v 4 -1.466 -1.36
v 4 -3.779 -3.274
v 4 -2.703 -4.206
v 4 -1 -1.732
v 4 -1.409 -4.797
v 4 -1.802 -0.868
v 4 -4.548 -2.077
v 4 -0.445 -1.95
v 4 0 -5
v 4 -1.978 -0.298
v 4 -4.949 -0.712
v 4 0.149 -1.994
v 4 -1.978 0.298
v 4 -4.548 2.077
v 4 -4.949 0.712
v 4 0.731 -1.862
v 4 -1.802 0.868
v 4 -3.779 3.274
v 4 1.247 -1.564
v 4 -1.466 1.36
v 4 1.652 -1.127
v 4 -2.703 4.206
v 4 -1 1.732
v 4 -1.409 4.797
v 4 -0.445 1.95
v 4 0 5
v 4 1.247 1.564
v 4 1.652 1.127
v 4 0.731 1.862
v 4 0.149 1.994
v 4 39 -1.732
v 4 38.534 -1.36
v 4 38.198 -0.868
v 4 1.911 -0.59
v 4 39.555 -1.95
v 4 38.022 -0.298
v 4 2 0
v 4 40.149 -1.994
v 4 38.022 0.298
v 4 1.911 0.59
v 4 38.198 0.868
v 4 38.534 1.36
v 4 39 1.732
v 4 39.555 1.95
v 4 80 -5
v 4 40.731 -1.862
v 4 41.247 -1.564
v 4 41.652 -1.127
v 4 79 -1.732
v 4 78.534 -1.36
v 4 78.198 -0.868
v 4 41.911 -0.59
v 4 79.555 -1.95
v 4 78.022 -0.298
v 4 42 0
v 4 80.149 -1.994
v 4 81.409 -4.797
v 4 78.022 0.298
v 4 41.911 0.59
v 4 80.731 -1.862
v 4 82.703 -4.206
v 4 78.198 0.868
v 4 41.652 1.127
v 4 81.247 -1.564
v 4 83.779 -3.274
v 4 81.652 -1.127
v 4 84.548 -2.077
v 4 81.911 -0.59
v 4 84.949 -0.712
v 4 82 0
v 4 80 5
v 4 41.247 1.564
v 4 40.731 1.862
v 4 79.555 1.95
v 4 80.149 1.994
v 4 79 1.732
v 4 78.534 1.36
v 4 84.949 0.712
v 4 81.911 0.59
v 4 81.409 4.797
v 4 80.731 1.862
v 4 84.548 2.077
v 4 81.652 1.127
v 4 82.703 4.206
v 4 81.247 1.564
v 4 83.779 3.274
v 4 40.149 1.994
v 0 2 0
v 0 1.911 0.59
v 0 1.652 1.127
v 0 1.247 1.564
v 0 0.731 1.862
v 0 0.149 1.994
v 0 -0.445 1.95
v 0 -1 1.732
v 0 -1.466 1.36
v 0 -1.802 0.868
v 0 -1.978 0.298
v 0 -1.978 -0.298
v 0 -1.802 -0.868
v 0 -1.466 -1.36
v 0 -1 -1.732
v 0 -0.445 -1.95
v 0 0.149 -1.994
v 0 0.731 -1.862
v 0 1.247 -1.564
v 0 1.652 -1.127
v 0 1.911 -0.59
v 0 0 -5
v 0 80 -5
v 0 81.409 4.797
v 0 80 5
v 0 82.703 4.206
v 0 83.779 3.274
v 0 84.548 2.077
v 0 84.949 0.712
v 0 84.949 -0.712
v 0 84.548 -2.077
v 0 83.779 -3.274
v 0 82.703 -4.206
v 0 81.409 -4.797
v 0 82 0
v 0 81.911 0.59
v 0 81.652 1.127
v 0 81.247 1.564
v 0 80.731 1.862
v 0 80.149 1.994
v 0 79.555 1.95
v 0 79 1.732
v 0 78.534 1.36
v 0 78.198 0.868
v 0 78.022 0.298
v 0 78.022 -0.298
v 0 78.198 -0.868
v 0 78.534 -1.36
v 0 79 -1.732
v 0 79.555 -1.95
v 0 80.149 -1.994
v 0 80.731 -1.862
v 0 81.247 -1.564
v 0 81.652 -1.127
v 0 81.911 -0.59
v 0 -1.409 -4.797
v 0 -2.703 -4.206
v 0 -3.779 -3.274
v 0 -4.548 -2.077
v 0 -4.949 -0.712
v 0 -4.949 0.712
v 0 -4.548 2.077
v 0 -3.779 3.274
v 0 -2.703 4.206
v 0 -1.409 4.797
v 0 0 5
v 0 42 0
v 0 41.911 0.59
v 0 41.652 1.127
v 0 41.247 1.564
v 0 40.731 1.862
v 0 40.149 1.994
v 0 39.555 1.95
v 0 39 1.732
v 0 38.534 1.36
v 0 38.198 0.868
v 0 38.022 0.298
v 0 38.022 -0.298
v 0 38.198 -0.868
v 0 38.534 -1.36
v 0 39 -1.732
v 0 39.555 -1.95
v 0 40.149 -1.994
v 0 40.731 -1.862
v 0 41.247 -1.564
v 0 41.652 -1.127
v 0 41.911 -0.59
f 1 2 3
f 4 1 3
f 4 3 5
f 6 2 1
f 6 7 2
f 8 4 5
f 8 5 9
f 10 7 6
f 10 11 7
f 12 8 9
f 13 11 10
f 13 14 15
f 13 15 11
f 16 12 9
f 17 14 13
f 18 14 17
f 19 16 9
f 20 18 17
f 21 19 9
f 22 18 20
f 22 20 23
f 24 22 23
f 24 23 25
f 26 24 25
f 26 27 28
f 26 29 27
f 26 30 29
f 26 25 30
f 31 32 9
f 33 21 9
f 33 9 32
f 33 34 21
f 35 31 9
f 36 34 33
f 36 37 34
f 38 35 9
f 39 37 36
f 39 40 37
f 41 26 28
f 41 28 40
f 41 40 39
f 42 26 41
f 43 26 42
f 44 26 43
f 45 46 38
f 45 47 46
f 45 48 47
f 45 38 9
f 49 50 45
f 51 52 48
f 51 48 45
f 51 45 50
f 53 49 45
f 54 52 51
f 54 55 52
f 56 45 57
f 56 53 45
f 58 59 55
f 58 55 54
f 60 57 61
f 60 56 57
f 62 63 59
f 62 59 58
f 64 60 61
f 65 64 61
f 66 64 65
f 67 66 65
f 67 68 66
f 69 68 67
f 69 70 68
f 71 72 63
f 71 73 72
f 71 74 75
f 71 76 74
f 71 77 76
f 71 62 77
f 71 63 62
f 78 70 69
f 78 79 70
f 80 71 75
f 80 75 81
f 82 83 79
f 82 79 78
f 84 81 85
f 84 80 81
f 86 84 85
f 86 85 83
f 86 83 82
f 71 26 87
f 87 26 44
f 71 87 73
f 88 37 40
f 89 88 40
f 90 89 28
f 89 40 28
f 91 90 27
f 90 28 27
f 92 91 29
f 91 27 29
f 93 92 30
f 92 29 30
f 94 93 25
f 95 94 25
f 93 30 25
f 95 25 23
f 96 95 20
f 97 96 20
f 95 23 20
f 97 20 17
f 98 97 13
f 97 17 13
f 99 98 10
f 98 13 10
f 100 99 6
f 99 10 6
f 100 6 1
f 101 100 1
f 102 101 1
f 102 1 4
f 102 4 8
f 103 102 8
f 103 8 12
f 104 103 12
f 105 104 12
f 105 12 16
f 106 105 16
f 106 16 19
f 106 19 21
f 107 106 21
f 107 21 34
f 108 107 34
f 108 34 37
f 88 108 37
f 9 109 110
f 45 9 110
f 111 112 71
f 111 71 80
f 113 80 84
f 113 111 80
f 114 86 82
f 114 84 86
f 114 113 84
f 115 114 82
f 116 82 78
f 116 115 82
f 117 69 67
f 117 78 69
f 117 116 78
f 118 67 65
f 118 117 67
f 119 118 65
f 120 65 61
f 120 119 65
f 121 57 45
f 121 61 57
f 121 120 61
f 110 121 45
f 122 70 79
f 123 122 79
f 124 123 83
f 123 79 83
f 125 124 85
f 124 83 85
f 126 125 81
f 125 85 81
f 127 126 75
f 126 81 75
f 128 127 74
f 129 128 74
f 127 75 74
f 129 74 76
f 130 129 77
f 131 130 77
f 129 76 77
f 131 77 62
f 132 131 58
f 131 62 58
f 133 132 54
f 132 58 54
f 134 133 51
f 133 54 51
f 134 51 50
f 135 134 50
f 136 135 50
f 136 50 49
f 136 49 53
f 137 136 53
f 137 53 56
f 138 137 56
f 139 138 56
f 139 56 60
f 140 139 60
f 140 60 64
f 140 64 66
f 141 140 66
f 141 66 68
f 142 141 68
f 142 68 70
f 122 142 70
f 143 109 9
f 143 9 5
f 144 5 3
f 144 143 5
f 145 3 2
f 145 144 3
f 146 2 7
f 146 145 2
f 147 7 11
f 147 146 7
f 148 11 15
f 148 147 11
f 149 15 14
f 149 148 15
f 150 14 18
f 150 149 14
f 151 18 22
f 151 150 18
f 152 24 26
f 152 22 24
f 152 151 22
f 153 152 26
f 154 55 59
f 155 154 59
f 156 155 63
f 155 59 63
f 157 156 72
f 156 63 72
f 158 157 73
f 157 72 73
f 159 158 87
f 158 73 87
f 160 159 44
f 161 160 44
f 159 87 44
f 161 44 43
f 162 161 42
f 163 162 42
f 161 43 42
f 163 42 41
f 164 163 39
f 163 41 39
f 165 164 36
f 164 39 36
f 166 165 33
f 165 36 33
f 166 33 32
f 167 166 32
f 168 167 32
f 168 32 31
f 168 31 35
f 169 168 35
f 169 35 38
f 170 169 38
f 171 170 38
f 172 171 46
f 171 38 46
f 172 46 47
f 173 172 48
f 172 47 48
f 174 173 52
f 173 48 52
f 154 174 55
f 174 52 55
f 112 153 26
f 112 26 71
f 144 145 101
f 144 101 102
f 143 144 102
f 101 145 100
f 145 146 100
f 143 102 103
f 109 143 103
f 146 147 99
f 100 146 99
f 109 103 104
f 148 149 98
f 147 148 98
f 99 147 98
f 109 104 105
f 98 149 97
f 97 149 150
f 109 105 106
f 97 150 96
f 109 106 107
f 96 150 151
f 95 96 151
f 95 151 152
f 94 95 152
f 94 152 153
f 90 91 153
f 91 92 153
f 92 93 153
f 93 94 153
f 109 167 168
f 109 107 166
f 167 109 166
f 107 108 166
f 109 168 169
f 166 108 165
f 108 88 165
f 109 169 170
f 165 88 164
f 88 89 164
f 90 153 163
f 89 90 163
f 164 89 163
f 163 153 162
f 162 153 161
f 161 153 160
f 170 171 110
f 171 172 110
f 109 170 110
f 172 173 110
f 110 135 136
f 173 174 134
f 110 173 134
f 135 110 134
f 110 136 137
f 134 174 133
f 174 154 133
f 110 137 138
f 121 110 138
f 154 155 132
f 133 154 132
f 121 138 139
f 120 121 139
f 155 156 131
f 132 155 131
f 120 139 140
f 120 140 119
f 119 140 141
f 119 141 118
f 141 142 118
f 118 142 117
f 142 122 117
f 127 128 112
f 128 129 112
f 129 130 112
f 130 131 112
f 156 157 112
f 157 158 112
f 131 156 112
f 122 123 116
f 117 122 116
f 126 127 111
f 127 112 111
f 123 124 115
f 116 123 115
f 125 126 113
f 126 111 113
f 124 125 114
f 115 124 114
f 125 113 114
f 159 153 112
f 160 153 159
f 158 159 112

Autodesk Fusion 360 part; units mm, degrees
sketch "Sketch1" plane through (0, 0, 0) normal (1, 0, 0) x (0, 1, 0)
  circle A0 centre (0, 0) radius 5
  line L0 (0, 5) -> (80, 5)
  line L1 (0, -5) -> (80, -5)
  circle A1 centre (80, 0) radius 5
  dimension "d1" = 10
  dimension "d2" = 80
extrude "Extrude1" add sketch "Sketch1" along normal blind 4
sketch "Sketch2" plane through (4, 0, 0) normal (1, 0, 0) x (0, 1, 0)
  arc A0 (0, 5) -> (0, -5) centre (0, 0) ccw
  line L0 (0, -5) -> (80, -5)
  arc A1 (80, -5) -> (80, 5) centre (80, 0) ccw
  line L1 (80, 5) -> (0, 5)
  circle A2 centre (0, 0) radius 2
  circle A3 centre (80, 0) radius 2
  dimension "d5" = 4
  dimension "d6" = 4
extrude "Extrude2" cut sketch "Sketch2" against normal blind 20 contours A2 | A3
sketch "Sketch3" plane through (4, 0, 0) normal (1, 0, 0) x (0, 1, 0)
  circle A0 centre (0, 0) radius 2
  circle A1 centre (80, 0) radius 2
  arc A2 (0, 5) -> (0, -5) centre (0, 0) ccw
  line L0 (0, -5) -> (80, -5)
  arc A3 (80, -5) -> (80, 5) centre (80, 0) ccw
  line L1 (80, 5) -> (0, 5)
  circle A4 centre (40, 0) radius 2
  dimension "d9" = 4
extrude "Extrude3" cut sketch "Sketch3" against normal blind 20 contours A4
sketch "Sketch4" plane through (0, 0, 0) normal (0, 0, 1) x (1, 0, 0)
sketch "Sketch5" plane through (4, 0, 0) normal (1, 0, 0) x (0, 1, 0)
  circle A0 centre (40, 0) radius 2
  circle A1 centre (0, 0) radius 2
  circle A2 centre (80, 0) radius 2
  arc A3 (0, 5) -> (0, -5) centre (0, 0) ccw
  line L0 (0, -5) -> (80, -5)
  arc A4 (80, -5) -> (80, 5) centre (80, 0) ccw
  line L1 (80, 5) -> (0, 5)
